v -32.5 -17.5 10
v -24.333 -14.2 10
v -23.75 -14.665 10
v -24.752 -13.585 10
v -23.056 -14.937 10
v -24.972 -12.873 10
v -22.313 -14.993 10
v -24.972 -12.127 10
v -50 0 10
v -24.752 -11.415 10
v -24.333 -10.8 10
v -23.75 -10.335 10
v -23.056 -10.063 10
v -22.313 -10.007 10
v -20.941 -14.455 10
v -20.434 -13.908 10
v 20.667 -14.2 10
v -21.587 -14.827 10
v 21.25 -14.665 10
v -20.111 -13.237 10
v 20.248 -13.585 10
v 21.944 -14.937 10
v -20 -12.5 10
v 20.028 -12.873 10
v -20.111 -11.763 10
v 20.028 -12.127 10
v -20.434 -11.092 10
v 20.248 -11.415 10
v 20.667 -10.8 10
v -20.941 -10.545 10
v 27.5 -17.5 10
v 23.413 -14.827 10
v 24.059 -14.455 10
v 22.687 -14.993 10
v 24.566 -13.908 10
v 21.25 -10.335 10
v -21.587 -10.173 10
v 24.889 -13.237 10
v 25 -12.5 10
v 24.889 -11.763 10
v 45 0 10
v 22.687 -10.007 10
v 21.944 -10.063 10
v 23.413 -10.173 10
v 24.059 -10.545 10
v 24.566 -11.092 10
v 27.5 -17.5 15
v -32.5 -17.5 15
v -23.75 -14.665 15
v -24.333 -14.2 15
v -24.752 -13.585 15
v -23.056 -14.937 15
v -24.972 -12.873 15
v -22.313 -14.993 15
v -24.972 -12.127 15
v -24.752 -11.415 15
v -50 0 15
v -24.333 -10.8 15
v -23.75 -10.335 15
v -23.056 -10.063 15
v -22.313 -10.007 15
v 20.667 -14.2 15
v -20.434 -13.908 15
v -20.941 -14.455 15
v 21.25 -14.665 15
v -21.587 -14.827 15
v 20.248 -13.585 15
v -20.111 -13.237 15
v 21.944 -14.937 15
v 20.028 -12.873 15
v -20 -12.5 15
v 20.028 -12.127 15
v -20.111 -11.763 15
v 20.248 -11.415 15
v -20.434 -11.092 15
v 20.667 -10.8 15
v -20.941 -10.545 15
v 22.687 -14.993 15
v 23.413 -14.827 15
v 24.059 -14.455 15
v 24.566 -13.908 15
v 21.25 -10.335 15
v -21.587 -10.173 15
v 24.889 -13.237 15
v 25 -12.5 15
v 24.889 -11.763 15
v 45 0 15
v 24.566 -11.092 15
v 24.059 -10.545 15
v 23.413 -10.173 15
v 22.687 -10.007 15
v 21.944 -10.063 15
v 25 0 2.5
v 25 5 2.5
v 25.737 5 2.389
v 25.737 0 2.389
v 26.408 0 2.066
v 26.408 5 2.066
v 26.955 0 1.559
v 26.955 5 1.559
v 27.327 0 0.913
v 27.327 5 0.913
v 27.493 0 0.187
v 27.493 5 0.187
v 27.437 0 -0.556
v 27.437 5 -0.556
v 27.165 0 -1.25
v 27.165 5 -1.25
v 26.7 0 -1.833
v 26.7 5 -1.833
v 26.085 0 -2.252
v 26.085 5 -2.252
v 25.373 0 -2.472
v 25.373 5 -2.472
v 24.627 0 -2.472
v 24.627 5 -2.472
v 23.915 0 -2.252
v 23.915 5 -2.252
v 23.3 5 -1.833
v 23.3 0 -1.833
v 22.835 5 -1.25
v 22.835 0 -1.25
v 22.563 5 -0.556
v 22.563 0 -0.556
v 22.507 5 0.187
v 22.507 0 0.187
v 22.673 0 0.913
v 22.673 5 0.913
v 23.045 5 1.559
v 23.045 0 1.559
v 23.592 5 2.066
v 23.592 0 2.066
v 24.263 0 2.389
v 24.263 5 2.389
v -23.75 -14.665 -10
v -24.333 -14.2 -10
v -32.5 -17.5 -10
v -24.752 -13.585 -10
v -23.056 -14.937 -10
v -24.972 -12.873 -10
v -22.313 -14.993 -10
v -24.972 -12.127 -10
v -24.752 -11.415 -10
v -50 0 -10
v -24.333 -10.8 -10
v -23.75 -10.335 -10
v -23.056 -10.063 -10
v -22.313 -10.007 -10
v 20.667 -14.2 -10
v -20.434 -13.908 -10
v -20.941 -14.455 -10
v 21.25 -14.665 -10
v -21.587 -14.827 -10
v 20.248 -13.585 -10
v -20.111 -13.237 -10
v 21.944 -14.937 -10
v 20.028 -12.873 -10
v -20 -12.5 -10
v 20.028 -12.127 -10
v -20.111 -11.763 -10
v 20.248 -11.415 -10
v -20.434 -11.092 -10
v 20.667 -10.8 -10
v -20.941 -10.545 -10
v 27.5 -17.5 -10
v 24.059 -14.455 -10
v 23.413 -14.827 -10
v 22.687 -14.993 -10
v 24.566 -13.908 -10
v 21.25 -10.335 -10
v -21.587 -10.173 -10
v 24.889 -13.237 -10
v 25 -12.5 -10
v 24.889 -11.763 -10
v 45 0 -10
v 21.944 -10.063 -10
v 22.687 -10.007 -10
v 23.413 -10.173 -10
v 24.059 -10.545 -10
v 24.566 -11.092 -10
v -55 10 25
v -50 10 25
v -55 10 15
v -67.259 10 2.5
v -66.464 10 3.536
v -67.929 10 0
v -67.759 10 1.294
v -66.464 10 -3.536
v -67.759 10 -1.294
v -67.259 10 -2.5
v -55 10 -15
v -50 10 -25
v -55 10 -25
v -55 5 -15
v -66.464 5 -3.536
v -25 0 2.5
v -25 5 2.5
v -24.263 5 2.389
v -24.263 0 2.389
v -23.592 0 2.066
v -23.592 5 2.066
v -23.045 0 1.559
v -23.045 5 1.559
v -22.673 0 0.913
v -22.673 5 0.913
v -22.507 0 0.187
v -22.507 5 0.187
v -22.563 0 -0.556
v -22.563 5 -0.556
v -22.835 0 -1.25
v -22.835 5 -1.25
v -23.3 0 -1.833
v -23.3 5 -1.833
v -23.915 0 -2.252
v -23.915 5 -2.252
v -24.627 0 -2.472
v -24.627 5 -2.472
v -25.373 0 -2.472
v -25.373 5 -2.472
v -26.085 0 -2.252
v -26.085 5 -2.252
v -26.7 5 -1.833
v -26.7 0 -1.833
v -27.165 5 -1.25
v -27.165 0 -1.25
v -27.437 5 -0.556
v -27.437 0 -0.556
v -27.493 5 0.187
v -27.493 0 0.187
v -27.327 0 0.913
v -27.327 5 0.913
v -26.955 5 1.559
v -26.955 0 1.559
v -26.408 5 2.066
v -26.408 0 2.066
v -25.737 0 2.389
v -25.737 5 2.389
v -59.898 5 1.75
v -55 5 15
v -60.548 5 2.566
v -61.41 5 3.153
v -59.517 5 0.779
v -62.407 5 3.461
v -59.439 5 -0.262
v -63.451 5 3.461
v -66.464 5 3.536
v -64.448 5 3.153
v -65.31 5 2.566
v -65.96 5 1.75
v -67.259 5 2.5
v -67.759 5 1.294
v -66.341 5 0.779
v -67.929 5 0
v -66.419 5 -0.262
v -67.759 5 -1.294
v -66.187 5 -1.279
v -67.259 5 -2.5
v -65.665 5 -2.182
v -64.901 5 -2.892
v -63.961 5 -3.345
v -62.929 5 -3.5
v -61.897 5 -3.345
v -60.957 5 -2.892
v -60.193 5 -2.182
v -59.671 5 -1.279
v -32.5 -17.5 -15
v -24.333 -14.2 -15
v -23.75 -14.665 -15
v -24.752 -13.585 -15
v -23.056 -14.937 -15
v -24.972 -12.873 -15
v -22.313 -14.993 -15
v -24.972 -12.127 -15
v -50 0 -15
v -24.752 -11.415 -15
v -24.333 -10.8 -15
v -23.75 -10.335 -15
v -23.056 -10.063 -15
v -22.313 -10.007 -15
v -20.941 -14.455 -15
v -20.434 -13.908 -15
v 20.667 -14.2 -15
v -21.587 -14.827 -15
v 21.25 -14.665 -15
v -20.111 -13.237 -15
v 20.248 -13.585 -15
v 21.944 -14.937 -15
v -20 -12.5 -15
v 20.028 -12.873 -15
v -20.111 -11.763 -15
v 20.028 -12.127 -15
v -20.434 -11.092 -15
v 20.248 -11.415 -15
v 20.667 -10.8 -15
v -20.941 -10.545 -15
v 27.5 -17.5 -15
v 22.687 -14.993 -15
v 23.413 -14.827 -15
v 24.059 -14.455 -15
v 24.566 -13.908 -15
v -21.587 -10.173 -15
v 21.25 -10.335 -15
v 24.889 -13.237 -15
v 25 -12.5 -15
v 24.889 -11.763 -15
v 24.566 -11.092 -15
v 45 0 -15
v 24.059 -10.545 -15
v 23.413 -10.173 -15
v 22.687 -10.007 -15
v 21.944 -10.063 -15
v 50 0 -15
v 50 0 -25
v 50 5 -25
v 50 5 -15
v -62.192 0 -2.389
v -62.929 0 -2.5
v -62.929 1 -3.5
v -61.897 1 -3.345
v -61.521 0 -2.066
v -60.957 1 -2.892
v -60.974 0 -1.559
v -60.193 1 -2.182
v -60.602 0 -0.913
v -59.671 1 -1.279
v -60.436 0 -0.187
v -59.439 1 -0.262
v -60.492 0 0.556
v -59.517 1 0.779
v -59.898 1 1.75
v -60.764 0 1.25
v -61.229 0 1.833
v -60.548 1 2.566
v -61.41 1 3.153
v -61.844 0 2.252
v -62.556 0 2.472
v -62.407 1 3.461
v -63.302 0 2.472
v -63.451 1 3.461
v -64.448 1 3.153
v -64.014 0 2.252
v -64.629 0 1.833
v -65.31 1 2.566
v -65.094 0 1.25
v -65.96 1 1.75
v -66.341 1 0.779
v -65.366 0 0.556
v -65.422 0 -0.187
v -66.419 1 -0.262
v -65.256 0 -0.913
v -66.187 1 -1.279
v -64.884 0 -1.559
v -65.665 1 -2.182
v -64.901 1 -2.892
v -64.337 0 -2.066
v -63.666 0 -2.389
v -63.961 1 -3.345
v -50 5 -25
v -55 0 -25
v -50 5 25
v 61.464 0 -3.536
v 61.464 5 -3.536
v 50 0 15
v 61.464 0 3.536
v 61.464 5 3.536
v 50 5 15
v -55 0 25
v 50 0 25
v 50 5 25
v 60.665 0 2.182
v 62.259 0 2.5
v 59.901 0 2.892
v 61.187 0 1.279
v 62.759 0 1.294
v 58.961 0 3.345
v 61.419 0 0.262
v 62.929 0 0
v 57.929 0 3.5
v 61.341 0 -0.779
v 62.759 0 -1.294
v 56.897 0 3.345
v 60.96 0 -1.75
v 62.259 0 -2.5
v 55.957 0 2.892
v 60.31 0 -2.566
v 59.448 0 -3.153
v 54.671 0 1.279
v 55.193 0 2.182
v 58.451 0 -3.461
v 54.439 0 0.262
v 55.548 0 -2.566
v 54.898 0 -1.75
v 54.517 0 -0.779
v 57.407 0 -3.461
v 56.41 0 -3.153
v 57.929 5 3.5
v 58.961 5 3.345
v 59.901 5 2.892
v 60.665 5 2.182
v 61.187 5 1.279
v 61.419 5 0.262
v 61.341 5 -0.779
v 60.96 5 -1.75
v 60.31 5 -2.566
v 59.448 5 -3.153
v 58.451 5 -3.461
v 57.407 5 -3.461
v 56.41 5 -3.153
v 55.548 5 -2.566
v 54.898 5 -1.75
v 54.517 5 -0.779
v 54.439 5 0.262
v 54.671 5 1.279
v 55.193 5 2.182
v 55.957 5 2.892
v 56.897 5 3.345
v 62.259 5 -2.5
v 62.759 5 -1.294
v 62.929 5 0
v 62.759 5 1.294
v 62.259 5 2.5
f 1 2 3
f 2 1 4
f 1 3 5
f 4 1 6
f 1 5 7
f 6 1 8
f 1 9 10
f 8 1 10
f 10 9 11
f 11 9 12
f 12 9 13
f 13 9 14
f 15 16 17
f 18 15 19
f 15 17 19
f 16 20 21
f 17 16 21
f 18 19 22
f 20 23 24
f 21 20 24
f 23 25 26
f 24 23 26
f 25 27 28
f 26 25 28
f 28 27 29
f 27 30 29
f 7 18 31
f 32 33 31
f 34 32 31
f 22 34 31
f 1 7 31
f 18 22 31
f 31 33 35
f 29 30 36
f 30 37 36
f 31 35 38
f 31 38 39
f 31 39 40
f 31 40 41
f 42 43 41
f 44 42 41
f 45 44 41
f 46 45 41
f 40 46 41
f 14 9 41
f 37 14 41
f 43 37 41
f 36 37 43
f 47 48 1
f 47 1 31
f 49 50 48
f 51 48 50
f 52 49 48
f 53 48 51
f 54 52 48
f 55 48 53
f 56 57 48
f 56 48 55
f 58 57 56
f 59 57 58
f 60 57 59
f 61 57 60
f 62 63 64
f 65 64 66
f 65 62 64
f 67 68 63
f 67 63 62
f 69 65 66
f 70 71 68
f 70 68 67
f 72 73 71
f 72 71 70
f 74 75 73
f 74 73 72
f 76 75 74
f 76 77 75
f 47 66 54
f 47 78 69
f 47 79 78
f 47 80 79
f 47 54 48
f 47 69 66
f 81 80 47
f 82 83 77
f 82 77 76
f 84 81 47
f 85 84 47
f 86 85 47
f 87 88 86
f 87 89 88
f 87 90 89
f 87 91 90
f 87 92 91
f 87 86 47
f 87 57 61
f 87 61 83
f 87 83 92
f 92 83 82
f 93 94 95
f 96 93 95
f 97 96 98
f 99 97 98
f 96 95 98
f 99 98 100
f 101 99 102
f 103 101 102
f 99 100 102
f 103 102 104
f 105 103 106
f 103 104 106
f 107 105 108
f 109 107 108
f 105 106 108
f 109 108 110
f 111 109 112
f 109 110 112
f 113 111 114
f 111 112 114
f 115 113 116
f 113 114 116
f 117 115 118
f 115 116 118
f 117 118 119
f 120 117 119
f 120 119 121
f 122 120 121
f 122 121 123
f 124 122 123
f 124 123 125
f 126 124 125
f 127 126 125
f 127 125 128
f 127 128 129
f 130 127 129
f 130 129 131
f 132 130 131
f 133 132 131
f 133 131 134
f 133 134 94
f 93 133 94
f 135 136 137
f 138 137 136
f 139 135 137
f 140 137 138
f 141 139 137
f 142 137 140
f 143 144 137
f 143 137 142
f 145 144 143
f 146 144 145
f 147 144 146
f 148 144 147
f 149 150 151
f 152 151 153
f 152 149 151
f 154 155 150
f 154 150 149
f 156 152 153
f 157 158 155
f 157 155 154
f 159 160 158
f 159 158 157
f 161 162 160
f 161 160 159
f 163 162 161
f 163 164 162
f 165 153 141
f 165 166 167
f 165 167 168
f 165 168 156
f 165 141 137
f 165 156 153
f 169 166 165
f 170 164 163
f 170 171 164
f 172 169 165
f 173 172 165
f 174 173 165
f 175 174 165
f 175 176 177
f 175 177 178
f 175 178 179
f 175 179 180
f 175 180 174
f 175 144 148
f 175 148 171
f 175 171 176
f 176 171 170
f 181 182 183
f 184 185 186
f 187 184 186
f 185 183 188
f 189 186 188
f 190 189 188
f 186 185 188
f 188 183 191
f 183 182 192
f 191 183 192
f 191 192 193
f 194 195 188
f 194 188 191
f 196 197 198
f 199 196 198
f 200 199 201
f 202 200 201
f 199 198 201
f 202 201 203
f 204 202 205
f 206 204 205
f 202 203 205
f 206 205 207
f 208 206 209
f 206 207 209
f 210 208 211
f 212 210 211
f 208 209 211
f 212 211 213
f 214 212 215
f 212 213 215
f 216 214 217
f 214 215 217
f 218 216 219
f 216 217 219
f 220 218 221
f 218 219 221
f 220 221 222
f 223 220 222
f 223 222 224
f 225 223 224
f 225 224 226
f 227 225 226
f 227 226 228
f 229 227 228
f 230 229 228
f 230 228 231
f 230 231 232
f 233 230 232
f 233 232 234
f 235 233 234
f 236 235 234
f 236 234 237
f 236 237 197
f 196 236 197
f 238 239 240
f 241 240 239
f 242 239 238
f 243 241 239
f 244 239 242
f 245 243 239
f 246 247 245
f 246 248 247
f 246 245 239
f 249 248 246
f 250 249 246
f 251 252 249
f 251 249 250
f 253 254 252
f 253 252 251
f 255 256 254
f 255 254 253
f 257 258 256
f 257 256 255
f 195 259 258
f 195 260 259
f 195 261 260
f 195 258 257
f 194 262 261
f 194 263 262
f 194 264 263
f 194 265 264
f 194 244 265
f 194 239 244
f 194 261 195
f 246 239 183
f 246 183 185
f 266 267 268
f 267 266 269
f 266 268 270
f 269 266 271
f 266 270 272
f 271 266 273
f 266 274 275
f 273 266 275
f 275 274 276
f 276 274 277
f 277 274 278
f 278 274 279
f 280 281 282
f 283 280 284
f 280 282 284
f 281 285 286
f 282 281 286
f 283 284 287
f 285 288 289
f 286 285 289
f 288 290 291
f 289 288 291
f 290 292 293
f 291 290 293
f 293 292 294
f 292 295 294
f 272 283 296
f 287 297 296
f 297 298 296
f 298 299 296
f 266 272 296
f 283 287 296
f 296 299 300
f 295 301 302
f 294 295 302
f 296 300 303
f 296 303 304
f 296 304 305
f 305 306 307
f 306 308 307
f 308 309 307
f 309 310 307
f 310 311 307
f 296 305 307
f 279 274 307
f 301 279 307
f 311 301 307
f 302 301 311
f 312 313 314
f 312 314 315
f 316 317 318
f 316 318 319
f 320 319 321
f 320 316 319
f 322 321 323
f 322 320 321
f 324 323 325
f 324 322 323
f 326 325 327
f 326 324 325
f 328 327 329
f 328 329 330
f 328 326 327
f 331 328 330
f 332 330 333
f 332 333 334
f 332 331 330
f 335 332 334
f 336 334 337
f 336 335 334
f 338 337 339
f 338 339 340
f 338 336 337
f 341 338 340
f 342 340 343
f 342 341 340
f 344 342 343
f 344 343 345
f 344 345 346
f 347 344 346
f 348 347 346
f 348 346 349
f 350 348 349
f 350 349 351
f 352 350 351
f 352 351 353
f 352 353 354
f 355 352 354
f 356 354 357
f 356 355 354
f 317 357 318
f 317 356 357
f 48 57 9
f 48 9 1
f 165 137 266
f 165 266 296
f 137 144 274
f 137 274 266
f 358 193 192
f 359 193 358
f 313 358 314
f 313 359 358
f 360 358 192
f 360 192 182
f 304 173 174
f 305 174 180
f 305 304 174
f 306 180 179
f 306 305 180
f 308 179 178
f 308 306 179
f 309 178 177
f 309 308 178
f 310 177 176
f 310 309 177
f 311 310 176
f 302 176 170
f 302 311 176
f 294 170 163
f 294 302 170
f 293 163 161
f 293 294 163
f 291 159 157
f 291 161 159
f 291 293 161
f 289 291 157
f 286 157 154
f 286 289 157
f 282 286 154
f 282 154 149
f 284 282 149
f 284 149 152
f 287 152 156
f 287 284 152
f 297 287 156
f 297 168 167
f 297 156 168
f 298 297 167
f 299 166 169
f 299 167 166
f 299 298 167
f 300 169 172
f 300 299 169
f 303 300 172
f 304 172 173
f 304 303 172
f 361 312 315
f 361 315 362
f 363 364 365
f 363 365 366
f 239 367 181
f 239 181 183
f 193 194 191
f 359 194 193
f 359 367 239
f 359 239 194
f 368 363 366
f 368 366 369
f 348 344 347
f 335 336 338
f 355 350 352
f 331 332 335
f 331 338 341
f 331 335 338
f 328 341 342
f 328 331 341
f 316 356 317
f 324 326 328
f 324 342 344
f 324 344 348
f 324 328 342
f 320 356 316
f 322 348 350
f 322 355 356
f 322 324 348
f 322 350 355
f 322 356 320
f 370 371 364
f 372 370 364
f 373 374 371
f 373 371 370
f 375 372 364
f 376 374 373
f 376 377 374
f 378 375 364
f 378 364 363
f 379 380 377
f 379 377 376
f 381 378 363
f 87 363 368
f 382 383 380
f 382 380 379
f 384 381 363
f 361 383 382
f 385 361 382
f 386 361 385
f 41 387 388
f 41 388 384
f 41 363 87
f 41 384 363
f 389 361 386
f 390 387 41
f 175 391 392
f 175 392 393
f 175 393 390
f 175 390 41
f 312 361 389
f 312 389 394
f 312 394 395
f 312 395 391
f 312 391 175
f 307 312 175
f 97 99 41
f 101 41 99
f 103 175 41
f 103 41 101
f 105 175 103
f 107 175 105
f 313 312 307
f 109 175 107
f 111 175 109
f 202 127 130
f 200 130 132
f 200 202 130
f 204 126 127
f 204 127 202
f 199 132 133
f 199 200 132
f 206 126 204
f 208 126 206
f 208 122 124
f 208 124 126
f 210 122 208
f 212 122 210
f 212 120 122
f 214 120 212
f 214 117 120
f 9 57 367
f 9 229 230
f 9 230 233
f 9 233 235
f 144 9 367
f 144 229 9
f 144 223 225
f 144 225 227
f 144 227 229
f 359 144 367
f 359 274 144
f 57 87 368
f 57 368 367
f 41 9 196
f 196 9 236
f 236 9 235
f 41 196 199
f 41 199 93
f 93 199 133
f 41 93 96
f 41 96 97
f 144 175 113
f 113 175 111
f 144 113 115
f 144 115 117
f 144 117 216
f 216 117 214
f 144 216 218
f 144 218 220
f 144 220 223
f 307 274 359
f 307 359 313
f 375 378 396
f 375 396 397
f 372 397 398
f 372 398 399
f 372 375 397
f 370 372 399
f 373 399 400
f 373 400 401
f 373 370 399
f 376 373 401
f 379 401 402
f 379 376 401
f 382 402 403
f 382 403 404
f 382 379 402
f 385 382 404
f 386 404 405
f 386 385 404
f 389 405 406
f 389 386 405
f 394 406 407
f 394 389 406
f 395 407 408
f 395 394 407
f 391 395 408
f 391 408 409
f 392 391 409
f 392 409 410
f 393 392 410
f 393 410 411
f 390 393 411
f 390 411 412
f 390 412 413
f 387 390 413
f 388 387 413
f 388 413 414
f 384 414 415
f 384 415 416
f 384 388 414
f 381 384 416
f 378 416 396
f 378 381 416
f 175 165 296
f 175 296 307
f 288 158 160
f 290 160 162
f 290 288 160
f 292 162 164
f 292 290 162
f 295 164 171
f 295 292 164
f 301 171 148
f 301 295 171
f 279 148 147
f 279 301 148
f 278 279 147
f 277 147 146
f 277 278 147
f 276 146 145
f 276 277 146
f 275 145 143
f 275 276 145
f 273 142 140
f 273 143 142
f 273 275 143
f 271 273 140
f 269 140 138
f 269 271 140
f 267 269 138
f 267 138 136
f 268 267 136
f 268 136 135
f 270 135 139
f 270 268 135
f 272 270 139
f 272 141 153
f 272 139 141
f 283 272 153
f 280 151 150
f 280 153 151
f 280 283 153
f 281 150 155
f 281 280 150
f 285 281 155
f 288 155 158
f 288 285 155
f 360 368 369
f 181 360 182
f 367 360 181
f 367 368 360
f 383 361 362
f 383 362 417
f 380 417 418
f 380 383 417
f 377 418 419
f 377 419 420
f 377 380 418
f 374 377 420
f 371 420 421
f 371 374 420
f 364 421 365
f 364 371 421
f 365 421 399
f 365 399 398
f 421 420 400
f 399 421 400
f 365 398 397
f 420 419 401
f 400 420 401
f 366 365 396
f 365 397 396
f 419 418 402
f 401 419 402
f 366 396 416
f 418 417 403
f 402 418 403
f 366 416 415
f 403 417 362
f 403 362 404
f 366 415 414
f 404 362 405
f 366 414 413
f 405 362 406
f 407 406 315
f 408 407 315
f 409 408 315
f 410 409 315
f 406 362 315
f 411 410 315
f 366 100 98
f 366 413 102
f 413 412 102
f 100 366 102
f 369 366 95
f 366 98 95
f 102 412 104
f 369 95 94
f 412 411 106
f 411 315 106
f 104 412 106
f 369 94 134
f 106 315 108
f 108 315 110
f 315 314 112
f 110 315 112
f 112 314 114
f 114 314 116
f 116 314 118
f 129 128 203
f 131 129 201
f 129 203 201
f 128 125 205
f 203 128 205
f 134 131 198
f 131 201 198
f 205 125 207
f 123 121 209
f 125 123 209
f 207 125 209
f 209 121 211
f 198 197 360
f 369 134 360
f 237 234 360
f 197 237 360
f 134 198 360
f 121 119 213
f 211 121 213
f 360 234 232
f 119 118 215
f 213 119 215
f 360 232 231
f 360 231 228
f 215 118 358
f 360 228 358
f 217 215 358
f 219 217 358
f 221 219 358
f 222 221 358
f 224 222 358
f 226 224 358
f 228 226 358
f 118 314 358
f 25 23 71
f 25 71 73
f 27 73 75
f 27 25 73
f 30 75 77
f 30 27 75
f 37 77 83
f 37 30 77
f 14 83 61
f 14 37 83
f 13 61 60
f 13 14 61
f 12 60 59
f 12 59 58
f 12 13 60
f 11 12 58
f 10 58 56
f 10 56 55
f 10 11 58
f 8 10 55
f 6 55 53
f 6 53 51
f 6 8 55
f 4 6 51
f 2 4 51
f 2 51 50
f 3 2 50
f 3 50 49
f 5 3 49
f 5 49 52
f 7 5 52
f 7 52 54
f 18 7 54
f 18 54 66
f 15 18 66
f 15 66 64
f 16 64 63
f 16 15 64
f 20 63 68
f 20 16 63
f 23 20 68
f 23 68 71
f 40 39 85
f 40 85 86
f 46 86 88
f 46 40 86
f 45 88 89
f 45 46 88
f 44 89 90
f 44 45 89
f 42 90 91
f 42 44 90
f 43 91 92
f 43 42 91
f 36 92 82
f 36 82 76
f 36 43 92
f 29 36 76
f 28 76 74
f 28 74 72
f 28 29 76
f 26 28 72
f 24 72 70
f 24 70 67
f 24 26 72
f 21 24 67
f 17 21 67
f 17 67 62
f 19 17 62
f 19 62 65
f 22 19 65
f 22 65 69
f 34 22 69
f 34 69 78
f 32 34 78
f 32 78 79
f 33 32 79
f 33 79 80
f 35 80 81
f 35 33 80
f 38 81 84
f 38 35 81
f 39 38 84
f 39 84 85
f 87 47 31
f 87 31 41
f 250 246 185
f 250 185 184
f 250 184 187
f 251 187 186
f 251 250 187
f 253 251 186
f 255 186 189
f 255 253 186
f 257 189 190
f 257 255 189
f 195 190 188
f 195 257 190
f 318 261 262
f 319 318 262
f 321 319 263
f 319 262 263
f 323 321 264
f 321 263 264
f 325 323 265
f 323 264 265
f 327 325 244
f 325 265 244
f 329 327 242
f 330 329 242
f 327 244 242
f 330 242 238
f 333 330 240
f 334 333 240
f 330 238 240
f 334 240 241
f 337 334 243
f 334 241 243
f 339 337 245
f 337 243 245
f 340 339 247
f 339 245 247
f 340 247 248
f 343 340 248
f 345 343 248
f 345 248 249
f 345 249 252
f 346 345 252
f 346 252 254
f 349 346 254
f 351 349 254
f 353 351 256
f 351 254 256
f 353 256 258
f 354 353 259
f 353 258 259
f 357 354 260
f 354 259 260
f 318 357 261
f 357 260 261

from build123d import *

# Parameters (mm, degrees)
SKETCH1_R           = 3.5
BOSS_EXTRUDE1_DEPTH = 5
BOSS_EXTRUDE2_DEPTH = 5
SKETCH3_R           = 3.5
BOSS_EXTRUDE3_DEPTH = 5
SKETCH4_R           = 2.5
BOSS_EXTRUDE4_DEPTH = 15
CUT_EXTRUDE1_REACH  = 76.469
SKETCH5_W           = 100
SKETCH5_H           = 20
CUT_EXTRUDE2_REACH  = 77.8
SKETCH6_R           = 2.5
CHAMFER1_SIZE       = 1


with BuildPart() as part:
    # Sketch1 → Boss-Extrude1 (new body)
    with BuildSketch(Plane(origin=(0, 0, 0), x_dir=(1, 0, 0), z_dir=(0, 1, 0))):
        with BuildLine():
            Line((50, 15), (61.464466094, 3.535533906))
            ThreePointArc((61.464466094, 3.535533906), (62.928932188, 0), (61.464466094, -3.535533906))
            Line((61.464466094, -3.535533906), (50, -15))
            Line((50, -15), (50, -25))
            Line((50, -25), (-55, -25))
            Line((-55, -25), (-55, 25))
            Line((-55, 25), (50, 25))
            Line((50, 25), (50, 15))
        make_face()
        with Locations(Location((57.928932188, 0, 0), (0, 0, 270))):
            Circle(SKETCH1_R, mode=Mode.SUBTRACT)
    extrude(amount=BOSS_EXTRUDE1_DEPTH)

    # Sketch2 → Boss-Extrude2 (add)
    with BuildSketch(Plane(origin=(0, 5, 0), x_dir=(1, 0, 0), z_dir=(0, 1, 0))):
        with BuildLine():
            Line((-50, 25), (-50, -25))
            Line((-50, -25), (-55, -25))
            Line((-55, -25), (-55, -15))
            Line((-55, -15), (-66.464466094, -3.535533906))
            ThreePointArc((-66.464466094, -3.535533906), (-67.928932188, 0), (-66.464466094, 3.535533906))
            Line((-66.464466094, 3.535533906), (-55, 15))
            Line((-55, 15), (-55, 25))
            Line((-55, 25), (-50, 25))
        make_face()
    extrude(amount=BOSS_EXTRUDE2_DEPTH)

    # Sketch3 → Boss-Extrude3 (add)
    with BuildSketch(Plane.XZ.offset(-5)):
        with Locations(Location((-62.928932188, 0, 0), (0, 0, 270))):
            Circle(SKETCH3_R)
    extrude(amount=BOSS_EXTRUDE3_DEPTH)

    # Sketch4 → Boss-Extrude4 (add, symmetric)
    with BuildSketch(Plane.XY):
        Polygon((-50, 0), (-32.5, -17.5), (27.5, -17.5), (45, 0), align=None)
        with Locations((-22.5, -12.5)):
            Circle(SKETCH4_R, mode=Mode.SUBTRACT)
        with Locations((22.5, -12.5)):
            Circle(SKETCH4_R, mode=Mode.SUBTRACT)
    extrude(amount=BOSS_EXTRUDE4_DEPTH, both=True)

    # Sketch5 → Cut-Extrude1 (cut, up to next)
    with BuildSketch(Plane.XZ, mode=Mode.PRIVATE) as cut_extrude1_sk1:
        Rectangle(SKETCH5_W, SKETCH5_H)
    cut_extrude1_tool1 = extrude(cut_extrude1_sk1.sketch, amount=CUT_EXTRUDE1_REACH, mode=Mode.PRIVATE) & part.part
    add(cut_extrude1_tool1.solids().sort_by_distance((0, 0, 0))[0], mode=Mode.SUBTRACT)

    # Sketch6 → Cut-Extrude2 (cut, up to next)
    with BuildSketch(Plane(origin=(0, 5, 0), x_dir=(1, 0, 0), z_dir=(0, 1, 0)), mode=Mode.PRIVATE) as cut_extrude2_sk1:
        with Locations(Location((25, 0, 0), (0, 0, 270))):
            Circle(SKETCH6_R)
    cut_extrude2_tool1 = extrude(cut_extrude2_sk1.sketch, amount=-CUT_EXTRUDE2_REACH, mode=Mode.PRIVATE) & part.part
    # Sketch6 → Cut-Extrude2 (cut, up to next)
    with BuildSketch(Plane(origin=(0, 5, 0), x_dir=(1, 0, 0), z_dir=(0, 1, 0)), mode=Mode.PRIVATE) as cut_extrude2_sk2:
        with Locations(Location((-25, 0, 0), (0, 0, 270))):
            Circle(SKETCH6_R)
    cut_extrude2_tool2 = extrude(cut_extrude2_sk2.sketch, amount=-CUT_EXTRUDE2_REACH, mode=Mode.PRIVATE) & part.part
    add(cut_extrude2_tool1.solids().sort_by_distance((25, 5, 0))[0], mode=Mode.SUBTRACT)
    add(cut_extrude2_tool2.solids().sort_by_distance((-25, 5, 0))[0], mode=Mode.SUBTRACT)

    # Chamfer1
    chamfer1_edges = [part.edges().sort_by_distance(p)[0] for p in [
        (-62.928932188, 0, 3.5),
    ]]
    chamfer(chamfer1_edges, length=CHAMFER1_SIZE)


solid = part.part
